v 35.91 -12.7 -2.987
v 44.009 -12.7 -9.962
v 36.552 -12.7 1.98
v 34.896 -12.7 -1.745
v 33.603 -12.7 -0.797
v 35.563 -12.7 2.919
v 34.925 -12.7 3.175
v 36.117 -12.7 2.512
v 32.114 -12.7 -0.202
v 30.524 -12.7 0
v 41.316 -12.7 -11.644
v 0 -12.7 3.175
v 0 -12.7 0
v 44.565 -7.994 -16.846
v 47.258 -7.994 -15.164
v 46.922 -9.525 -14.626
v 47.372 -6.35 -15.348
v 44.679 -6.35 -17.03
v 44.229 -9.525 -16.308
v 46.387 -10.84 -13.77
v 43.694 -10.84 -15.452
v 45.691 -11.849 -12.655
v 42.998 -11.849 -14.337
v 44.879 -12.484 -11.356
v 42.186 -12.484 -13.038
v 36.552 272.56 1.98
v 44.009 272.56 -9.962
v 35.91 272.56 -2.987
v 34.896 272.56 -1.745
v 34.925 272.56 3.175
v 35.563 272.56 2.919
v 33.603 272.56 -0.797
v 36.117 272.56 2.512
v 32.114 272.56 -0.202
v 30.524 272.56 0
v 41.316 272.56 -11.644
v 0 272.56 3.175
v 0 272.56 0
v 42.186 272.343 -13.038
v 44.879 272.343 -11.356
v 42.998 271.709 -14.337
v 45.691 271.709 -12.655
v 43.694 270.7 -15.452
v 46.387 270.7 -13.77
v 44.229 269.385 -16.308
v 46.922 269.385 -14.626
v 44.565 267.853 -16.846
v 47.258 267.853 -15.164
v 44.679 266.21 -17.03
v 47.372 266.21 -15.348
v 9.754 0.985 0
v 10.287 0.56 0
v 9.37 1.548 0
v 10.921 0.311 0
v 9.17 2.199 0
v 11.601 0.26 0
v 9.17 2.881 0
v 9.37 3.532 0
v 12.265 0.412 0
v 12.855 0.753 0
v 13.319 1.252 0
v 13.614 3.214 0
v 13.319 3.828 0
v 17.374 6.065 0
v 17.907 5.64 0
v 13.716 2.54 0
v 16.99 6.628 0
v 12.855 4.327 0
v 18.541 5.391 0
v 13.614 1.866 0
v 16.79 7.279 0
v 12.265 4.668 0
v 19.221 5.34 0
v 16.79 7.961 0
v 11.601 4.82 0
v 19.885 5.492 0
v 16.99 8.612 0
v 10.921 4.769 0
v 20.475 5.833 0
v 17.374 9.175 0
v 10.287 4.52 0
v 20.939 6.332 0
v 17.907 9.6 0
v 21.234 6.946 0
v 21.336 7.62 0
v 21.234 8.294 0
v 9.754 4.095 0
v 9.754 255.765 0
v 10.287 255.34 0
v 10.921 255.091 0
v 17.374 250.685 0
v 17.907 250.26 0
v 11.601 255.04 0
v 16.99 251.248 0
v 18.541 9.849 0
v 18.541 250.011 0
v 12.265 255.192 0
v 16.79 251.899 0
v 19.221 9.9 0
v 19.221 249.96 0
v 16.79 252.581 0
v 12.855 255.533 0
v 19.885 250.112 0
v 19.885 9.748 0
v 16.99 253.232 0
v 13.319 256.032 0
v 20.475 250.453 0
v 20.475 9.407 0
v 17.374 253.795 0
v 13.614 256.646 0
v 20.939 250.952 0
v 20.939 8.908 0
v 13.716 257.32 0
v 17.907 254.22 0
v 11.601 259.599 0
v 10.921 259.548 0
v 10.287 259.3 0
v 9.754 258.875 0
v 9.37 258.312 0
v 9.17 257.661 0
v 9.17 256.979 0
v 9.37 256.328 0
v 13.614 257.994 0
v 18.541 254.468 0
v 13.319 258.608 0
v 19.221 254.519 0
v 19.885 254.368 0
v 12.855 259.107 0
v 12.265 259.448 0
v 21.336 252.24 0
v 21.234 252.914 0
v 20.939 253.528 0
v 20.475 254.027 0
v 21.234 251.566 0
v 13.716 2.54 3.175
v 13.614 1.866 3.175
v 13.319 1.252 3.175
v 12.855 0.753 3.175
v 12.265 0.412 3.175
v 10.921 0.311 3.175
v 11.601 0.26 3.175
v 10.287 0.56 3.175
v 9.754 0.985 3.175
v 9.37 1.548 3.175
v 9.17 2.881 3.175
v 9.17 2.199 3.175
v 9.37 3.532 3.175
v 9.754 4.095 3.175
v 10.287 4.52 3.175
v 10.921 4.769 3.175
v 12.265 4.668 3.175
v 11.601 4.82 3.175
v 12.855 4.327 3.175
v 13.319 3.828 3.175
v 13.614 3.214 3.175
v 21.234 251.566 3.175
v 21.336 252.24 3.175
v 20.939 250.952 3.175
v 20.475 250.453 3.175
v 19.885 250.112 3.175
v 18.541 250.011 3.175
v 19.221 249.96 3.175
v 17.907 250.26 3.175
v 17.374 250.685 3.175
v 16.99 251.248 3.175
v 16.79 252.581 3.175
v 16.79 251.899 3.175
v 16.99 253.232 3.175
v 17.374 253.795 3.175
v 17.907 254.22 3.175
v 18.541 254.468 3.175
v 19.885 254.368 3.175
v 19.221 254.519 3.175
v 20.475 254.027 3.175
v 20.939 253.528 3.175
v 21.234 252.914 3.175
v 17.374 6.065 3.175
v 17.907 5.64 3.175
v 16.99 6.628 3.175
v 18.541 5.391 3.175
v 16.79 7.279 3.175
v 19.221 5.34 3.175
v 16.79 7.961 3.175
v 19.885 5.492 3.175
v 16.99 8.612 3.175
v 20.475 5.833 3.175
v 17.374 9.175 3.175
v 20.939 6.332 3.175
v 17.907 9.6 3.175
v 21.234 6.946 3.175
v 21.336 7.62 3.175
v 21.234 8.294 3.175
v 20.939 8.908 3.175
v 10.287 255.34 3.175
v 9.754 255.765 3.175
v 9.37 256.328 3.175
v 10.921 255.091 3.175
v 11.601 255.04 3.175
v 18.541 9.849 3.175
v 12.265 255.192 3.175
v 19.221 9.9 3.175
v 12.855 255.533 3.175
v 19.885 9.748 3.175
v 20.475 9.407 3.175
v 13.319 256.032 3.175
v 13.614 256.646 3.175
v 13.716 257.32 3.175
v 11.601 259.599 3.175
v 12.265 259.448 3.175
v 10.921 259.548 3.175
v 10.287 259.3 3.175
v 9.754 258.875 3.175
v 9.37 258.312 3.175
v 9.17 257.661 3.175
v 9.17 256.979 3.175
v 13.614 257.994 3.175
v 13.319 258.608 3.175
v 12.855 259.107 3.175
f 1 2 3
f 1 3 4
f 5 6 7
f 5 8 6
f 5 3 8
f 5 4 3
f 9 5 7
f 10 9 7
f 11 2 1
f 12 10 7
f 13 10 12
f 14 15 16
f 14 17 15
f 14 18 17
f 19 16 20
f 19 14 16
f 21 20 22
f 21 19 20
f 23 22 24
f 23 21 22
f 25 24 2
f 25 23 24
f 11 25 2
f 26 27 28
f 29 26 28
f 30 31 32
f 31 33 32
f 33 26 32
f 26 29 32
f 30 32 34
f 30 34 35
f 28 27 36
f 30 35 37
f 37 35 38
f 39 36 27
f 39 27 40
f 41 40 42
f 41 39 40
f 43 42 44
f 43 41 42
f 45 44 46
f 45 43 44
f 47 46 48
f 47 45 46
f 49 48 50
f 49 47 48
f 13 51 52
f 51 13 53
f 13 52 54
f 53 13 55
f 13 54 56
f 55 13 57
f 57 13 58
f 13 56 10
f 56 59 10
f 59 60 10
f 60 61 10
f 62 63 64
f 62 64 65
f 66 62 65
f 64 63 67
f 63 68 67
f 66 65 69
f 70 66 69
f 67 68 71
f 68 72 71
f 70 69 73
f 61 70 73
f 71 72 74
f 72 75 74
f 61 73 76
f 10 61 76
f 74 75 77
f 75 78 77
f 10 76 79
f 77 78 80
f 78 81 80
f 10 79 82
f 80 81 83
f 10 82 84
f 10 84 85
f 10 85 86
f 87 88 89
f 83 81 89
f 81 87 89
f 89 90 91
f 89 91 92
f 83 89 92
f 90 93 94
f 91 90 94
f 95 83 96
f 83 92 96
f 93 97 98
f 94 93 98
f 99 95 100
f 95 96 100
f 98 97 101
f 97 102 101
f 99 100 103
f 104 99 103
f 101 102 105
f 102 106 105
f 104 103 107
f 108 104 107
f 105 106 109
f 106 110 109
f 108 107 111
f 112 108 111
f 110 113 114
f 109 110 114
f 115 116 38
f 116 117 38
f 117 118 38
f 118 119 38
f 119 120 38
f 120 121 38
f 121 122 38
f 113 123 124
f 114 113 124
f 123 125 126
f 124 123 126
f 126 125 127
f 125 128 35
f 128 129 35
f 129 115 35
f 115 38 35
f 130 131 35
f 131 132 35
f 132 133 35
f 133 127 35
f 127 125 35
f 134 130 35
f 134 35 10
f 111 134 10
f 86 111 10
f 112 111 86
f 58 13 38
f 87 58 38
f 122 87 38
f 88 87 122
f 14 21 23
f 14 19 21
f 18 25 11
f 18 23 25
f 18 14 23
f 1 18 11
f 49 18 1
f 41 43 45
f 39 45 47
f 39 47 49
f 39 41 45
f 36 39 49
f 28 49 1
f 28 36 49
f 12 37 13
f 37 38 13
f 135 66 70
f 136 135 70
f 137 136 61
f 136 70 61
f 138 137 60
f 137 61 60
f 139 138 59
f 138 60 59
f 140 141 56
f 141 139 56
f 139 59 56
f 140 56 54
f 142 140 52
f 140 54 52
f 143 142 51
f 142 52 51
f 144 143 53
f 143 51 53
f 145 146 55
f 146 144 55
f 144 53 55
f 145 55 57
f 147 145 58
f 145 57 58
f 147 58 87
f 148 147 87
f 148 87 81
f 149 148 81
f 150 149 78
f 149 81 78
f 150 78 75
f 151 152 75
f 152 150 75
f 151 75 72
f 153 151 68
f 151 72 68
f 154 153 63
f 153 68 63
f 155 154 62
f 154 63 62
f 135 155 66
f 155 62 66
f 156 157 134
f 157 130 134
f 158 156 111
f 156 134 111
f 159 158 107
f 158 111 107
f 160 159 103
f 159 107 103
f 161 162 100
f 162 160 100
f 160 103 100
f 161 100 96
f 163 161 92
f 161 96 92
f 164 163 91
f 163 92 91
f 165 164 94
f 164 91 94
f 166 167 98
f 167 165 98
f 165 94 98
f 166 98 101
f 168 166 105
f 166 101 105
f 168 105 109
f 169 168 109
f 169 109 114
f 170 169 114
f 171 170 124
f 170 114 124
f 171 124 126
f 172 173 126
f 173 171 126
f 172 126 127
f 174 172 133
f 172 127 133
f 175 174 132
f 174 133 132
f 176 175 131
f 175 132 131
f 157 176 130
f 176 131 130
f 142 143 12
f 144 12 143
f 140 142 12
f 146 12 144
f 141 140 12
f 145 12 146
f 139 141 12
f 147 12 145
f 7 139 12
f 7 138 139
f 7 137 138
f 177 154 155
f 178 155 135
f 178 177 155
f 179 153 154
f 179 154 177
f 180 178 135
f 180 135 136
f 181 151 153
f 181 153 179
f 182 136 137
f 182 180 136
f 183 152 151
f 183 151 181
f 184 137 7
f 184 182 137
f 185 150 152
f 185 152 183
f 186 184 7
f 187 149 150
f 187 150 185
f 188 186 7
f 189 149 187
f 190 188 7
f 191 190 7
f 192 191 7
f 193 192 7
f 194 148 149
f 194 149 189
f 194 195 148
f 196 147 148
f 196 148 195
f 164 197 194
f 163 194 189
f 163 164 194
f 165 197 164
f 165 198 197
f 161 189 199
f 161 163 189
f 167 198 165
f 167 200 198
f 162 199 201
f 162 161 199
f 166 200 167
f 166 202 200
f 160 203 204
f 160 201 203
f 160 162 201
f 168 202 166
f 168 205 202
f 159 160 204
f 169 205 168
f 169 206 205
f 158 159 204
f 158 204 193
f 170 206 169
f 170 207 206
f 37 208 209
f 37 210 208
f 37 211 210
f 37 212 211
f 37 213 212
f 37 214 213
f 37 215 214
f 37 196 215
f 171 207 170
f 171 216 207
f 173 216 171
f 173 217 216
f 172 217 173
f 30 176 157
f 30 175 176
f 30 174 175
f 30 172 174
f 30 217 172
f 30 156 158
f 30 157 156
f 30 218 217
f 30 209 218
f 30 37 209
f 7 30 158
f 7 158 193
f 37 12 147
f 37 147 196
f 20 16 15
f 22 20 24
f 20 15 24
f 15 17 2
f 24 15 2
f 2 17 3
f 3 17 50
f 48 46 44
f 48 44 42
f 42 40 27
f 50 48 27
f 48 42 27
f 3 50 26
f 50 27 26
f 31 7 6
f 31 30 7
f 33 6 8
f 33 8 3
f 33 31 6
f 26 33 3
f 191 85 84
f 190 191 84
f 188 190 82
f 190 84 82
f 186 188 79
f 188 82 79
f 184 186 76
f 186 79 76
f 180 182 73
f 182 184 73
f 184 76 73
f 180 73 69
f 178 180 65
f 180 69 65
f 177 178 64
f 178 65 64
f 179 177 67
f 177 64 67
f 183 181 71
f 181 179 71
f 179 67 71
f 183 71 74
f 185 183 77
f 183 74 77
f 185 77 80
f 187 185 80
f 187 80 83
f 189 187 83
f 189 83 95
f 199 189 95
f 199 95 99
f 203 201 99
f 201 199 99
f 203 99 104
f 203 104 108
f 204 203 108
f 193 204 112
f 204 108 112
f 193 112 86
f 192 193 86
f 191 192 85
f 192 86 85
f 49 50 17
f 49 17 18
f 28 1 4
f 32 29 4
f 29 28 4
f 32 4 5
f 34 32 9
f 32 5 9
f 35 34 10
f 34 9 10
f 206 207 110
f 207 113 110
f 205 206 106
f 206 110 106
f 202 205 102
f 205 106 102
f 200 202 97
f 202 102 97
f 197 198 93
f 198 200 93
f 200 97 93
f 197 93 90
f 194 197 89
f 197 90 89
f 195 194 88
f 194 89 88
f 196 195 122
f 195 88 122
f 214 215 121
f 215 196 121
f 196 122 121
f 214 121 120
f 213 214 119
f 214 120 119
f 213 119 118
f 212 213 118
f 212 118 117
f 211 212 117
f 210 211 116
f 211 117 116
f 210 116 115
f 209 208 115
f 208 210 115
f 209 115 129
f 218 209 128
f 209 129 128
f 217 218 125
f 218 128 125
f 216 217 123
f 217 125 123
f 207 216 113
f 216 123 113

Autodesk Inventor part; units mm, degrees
ref_plane "YZ Plane" through (0, 0, 0) normal (1, 0, 0) x (0, 1, 0)
ref_plane "XZ Plane" through (0, 0, 0) normal (0, 1, 0) x (-1, 0, 0)
ref_plane "Work Plane1" through (0, 0, 0) normal (0, 0, 1) x (1, 0, 0)
sketch "Sketch1" plane through (0, 0, 0) normal (0, 0, 1) x (1, 0, 0)
  circle A0 centre (11.43, 2.54) radius 2.286 projected
  circle A1 centre (19.05, 7.62) radius 2.286 projected
  circle A2 centre (19.05, 252.2398) radius 2.286 projected
  circle A3 centre (11.43, 257.3198) radius 2.286 projected
  line L0 (22.225, -12.7) -> (-22.225, -12.7) projected
  line L1 (22.225, 272.5598) -> (-22.225, 272.5598) projected
  line L2 (34.925, -12.7) -> (-22.225, -12.7)
  line L3 (-22.225, -12.7) -> (-22.225, 272.5598) construction
  line L4 (-22.225, 272.5598) -> (34.925, 272.5598)
  line L5 (34.925, 272.5598) -> (34.925, -12.7)
  line L6 (0, 272.5598) -> (0, -12.7)
  point P0 (0, 0)
  point P1 (-22.225, -12.7)
  point P2 (0, -12.7)
  point P3 (0, -12.7)
  dimension "d0" = 57.15
  dimension "d9" = 34.925
extrude "Extrusion1" add sketch "Sketch1" along normal blind 3.175
sketch "Sketch2" plane through (-22.225, 272.5598, 0) normal (0, 1, 0) x (1, 0, 0)
  line L0 (69.8754, 18.7905) -> (57.15, -1.5875) construction
  line L1 (57.15, 0) -> (57.15, -3.175) projected
  line L2 (66.9043, 17.0297) -> (55.5406, -1.1676)
  line L3 (69.5973, 15.348) -> (58.7765, -1.98)
  arc A0 (57.15, -3.175) -> (58.7765, -1.98) centre (56.4627, -0.5351) ccw
  line L4 (57.15, -3.175) -> (55.5406, -1.1676)
  line L5 (69.5973, 15.348) -> (66.9043, 17.0297)
  point P0 (22.225, 0)
  dimension "d4" = 1.5875
  dimension "d5" = 1.5875
extrude "Extrusion2" add sketch "Sketch2" against normal up to surface (285.2598 mm away)
fillet "Fillet1" radius 6.35 3 edges at (46.0258, 272.5598, -16.1889) (34.0447, 129.9299, 0) (46.0258, -12.7, -16.1889)
properties part number "PolyIntakeTop" material "Polycarbonate, Smoke"
